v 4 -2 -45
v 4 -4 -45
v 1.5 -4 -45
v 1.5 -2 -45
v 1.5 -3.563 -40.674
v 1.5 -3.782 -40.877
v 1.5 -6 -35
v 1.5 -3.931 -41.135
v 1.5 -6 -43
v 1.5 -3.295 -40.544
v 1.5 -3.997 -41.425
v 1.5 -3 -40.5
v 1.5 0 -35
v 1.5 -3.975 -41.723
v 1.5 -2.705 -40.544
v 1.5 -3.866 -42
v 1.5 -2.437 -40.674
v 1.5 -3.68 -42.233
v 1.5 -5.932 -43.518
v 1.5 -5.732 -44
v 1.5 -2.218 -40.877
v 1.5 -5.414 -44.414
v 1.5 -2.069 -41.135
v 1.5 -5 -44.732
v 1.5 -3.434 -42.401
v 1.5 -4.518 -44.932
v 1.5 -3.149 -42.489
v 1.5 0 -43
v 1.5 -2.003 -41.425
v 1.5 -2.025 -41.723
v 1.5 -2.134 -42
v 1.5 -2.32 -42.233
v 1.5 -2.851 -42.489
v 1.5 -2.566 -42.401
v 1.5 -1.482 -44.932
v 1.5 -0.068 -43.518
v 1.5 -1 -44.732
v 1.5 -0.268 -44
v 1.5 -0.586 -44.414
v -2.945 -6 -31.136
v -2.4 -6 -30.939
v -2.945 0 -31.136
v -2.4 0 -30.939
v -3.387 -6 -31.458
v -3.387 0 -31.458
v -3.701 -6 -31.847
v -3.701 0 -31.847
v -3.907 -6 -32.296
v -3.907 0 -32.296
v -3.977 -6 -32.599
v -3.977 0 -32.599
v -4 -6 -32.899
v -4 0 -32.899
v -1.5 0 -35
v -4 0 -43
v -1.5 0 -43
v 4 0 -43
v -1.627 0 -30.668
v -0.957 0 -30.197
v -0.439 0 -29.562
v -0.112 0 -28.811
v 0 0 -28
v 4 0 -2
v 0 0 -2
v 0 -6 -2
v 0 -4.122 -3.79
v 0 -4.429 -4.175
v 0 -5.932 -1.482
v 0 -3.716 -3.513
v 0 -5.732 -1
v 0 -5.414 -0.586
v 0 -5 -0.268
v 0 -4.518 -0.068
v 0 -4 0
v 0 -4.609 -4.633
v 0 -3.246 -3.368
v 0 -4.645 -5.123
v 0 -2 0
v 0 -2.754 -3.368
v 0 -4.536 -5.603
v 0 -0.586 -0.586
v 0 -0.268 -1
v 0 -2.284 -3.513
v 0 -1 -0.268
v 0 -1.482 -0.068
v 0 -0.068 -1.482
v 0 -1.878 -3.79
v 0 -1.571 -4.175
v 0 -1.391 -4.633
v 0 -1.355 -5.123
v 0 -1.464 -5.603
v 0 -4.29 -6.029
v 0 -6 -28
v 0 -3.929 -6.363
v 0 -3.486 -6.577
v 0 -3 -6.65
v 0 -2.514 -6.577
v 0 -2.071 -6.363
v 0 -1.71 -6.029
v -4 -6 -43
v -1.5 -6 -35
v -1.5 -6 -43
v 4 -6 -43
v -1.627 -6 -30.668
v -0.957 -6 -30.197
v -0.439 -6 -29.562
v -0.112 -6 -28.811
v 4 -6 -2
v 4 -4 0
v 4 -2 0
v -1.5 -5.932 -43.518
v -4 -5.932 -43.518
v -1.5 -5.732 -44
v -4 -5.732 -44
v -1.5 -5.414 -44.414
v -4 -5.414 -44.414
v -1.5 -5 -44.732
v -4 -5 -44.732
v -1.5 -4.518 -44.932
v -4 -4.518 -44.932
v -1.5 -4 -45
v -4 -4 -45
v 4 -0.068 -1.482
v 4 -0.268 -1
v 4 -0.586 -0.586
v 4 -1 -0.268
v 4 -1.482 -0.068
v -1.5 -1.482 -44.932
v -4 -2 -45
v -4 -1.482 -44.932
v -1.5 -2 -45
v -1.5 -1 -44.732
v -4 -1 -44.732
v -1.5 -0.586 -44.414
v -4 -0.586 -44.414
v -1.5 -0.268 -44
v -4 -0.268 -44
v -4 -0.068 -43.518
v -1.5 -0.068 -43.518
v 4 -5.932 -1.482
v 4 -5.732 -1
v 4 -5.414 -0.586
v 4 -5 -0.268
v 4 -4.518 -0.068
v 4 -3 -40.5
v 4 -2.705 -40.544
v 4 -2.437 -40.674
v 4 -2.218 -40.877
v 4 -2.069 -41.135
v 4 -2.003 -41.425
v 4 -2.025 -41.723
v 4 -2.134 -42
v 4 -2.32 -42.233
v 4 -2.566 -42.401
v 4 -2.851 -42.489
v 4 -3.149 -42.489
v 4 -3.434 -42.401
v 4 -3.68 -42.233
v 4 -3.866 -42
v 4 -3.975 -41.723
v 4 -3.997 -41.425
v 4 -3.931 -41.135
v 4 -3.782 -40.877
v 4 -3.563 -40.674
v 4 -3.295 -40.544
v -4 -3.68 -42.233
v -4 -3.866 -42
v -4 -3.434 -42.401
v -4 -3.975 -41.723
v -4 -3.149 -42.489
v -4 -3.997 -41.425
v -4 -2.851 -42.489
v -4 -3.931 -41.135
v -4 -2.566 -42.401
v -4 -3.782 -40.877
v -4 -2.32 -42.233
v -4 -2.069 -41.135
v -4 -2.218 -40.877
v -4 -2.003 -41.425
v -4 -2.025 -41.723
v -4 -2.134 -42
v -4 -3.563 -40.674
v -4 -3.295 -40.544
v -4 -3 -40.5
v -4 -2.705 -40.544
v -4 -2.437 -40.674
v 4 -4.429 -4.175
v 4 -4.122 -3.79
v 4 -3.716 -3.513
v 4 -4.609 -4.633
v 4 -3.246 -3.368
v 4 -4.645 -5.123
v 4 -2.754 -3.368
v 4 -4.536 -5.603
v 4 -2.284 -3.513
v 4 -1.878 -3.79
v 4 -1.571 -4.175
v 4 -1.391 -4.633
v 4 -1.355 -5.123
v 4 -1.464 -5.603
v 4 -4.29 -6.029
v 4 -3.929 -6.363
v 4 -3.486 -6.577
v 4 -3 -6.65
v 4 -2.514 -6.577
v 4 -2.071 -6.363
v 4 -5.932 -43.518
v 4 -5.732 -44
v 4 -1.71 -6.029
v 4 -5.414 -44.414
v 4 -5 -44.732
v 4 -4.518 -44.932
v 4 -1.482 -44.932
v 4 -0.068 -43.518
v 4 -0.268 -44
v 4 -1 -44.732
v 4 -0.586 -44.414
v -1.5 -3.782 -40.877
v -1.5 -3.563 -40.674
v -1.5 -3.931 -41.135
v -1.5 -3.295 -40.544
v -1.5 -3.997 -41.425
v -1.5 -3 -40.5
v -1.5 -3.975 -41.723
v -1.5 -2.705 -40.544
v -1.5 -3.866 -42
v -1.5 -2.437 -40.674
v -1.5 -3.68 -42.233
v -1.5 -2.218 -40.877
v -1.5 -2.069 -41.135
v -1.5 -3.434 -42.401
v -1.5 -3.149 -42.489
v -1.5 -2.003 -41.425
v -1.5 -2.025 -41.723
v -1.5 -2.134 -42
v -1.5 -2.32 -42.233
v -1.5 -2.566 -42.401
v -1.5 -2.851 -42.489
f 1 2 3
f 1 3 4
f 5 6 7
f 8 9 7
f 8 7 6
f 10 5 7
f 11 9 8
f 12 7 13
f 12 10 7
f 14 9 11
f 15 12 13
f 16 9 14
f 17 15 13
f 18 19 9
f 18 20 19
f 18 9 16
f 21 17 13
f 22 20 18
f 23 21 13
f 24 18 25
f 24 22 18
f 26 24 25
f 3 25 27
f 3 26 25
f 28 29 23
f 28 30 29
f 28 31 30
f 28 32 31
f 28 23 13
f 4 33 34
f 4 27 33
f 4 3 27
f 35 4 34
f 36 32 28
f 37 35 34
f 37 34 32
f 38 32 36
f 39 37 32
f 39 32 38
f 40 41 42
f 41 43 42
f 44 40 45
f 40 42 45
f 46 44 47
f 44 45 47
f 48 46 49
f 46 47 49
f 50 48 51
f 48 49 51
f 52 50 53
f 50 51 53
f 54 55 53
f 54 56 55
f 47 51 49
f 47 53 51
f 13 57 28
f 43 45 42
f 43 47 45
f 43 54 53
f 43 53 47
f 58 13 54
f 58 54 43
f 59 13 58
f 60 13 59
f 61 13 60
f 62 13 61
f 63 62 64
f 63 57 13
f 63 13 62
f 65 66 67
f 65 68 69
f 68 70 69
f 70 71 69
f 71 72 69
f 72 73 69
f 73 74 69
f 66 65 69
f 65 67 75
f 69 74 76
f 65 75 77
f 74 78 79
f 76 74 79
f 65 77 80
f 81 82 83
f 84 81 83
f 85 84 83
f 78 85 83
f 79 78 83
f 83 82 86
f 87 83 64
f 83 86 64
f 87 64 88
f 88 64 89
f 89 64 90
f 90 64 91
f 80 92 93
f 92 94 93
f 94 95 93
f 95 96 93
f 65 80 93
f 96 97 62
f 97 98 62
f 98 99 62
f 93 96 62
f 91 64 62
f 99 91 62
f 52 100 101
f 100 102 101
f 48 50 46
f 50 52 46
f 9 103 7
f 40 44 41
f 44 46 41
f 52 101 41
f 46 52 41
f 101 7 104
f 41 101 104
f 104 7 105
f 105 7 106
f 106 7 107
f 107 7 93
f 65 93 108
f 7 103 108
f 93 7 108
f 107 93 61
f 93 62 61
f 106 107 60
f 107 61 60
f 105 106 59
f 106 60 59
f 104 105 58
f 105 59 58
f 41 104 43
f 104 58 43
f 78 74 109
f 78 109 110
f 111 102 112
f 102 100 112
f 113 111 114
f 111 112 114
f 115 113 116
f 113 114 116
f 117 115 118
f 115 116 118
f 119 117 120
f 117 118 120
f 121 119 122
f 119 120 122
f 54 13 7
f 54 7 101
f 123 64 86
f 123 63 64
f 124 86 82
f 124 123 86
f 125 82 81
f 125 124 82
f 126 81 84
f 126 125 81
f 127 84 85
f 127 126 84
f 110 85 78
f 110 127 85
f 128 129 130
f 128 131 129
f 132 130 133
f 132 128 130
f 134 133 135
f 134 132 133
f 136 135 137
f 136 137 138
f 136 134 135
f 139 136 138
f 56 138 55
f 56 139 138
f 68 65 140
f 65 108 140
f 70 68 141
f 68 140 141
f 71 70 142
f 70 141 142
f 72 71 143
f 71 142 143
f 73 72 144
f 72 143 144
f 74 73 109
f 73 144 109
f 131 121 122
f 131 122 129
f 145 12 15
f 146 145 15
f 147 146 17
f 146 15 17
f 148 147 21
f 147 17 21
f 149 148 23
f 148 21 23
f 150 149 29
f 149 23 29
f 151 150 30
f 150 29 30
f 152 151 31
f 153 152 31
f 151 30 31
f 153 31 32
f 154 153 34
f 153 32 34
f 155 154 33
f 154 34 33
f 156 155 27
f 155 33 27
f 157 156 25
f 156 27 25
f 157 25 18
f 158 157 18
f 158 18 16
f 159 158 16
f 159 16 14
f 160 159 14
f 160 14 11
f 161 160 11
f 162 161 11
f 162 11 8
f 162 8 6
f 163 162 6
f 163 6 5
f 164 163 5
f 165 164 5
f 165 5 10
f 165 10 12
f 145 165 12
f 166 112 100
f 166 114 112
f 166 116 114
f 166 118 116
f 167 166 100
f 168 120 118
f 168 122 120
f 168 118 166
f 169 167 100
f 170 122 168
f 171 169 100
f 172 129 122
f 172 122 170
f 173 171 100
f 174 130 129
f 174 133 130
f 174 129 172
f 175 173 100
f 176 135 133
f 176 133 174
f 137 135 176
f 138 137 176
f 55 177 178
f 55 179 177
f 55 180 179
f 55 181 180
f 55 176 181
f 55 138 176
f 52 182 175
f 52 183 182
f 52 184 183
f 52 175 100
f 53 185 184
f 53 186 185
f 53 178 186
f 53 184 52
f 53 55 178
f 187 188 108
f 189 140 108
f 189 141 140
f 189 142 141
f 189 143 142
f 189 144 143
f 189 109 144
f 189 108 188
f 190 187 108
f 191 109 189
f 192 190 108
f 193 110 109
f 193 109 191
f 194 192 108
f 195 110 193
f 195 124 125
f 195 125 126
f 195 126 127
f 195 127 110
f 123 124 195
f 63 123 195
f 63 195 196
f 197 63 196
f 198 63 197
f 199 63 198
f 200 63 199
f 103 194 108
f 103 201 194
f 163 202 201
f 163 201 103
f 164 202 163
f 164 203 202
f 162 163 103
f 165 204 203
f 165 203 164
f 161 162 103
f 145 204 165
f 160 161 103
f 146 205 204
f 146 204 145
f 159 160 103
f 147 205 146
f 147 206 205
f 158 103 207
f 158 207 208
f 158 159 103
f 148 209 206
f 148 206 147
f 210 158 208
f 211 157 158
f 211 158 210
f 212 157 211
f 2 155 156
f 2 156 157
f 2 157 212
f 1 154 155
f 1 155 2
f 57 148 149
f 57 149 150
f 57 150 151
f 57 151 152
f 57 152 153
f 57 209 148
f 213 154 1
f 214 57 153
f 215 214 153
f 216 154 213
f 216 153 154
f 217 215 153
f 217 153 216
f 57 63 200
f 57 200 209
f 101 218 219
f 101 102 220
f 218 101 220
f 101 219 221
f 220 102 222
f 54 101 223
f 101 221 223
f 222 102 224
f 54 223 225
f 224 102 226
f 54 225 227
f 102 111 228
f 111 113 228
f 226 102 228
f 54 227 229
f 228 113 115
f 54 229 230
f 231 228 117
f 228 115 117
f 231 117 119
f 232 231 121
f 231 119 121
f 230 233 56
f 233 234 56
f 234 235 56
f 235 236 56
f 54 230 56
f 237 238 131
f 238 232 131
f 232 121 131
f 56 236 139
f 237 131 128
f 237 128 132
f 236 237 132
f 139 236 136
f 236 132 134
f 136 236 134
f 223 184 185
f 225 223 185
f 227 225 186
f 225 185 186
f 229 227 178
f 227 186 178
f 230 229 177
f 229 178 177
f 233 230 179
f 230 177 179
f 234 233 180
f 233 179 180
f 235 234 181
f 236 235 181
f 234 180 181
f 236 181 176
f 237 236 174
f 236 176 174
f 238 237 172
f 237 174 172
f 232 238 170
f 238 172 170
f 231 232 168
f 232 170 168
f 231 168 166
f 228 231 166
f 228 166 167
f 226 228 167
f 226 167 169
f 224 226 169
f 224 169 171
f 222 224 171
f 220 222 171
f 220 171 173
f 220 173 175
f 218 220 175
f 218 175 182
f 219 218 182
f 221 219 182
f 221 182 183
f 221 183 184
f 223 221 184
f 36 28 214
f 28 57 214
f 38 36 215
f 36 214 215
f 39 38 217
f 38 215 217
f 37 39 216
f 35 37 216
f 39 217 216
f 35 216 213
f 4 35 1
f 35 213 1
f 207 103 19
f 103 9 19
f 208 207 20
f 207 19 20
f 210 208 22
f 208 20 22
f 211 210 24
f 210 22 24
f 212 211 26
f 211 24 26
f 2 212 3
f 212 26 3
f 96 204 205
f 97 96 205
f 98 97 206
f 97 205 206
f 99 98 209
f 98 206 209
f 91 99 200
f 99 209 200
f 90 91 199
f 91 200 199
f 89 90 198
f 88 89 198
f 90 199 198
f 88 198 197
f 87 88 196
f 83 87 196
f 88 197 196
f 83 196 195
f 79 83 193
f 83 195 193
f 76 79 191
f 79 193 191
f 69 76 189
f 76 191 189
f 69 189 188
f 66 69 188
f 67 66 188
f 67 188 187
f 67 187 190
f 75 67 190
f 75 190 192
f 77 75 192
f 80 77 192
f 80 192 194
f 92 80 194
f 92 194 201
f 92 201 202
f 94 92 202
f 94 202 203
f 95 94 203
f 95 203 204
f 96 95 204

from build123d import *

# Parameters (mm, degrees)
SKETCH1_W           = 45
SKETCH1_H           = 6
BOSS_EXTRUDE1_DEPTH = 4
SKETCH2_R           = 1.65
CUT_EXTRUDE1_DEPTH  = 46.57411546
SKETCH4_W           = 14
SKETCH4_H           = 6
BOSS_EXTRUDE2_DEPTH = 4
SKETCH5_W           = 3
SKETCH5_H           = 6
CUT_EXTRUDE2_DEPTH  = 10
SKETCH6_R           = 1
CUT_EXTRUDE3_DEPTH  = 47.097722286
FILLET1_R           = 2
FILLET2_R           = 3
FILLET3_R           = 2
FILLET4_R           = 2


with BuildPart() as part:
    # Sketch1 → Boss-Extrude1 (new body)
    with BuildSketch(Plane(origin=(0, 0, 0), x_dir=(0, 0, -1), z_dir=(1, 0, 0))):
        with Locations((22.5, -3)):
            Rectangle(SKETCH1_W, SKETCH1_H)
    extrude(amount=BOSS_EXTRUDE1_DEPTH)

    # Sketch2 → Cut-Extrude1 (cut, through all)
    with BuildSketch(Plane(origin=(4, 0, 0), x_dir=(0, 0, -1), z_dir=(1, 0, 0))):
        with Locations((5, -3)):
            Circle(SKETCH2_R)
    extrude(amount=-CUT_EXTRUDE1_DEPTH, mode=Mode.SUBTRACT)

    # Sketch4 → Boss-Extrude2 (add)
    with BuildSketch(Plane.ZY):
        with Locations((-38, -3)):
            Rectangle(SKETCH4_W, SKETCH4_H)
    extrude(amount=BOSS_EXTRUDE2_DEPTH)

    # Sketch5 → Cut-Extrude2 (cut)
    with BuildSketch(Plane(origin=(0, 0, -45), x_dir=(-1, 0, 0), z_dir=(0, 0, -1))):
        with Locations((0, -3)):
            Rectangle(SKETCH5_W, SKETCH5_H)
    extrude(amount=-CUT_EXTRUDE2_DEPTH, mode=Mode.SUBTRACT)

    # Sketch6 → Cut-Extrude3 (cut, through all)
    with BuildSketch(Plane.ZY.offset(4)):
        with Locations((-41.5, -3)):
            Circle(SKETCH6_R)
    extrude(amount=-CUT_EXTRUDE3_DEPTH, mode=Mode.SUBTRACT)

    # Fillet1
    fillet1_edges = [part.edges().sort_by_distance(p)[0] for p in [
        (2, 0, 0),
        (2.75, 0, -45),
        (2.75, -6, -45),
        (2, -6, 0),
    ]]
    fillet(fillet1_edges, radius=FILLET1_R)

    # Fillet2
    fillet2_edges = [part.edges().sort_by_distance(p)[0] for p in [
        (0, -3, -31),
    ]]
    fillet(fillet2_edges, radius=FILLET2_R)

    # Fillet3
    fillet3_edges = [part.edges().sort_by_distance(p)[0] for p in [
        (-4, -3, -31),
    ]]
    fillet(fillet3_edges, radius=FILLET3_R)

    # Fillet4
    fillet4_edges = [part.edges().sort_by_distance(p)[0] for p in [
        (-2.75, 0, -45),
        (-2.75, -6, -45),
    ]]
    fillet(fillet4_edges, radius=FILLET4_R)


solid = part.part
